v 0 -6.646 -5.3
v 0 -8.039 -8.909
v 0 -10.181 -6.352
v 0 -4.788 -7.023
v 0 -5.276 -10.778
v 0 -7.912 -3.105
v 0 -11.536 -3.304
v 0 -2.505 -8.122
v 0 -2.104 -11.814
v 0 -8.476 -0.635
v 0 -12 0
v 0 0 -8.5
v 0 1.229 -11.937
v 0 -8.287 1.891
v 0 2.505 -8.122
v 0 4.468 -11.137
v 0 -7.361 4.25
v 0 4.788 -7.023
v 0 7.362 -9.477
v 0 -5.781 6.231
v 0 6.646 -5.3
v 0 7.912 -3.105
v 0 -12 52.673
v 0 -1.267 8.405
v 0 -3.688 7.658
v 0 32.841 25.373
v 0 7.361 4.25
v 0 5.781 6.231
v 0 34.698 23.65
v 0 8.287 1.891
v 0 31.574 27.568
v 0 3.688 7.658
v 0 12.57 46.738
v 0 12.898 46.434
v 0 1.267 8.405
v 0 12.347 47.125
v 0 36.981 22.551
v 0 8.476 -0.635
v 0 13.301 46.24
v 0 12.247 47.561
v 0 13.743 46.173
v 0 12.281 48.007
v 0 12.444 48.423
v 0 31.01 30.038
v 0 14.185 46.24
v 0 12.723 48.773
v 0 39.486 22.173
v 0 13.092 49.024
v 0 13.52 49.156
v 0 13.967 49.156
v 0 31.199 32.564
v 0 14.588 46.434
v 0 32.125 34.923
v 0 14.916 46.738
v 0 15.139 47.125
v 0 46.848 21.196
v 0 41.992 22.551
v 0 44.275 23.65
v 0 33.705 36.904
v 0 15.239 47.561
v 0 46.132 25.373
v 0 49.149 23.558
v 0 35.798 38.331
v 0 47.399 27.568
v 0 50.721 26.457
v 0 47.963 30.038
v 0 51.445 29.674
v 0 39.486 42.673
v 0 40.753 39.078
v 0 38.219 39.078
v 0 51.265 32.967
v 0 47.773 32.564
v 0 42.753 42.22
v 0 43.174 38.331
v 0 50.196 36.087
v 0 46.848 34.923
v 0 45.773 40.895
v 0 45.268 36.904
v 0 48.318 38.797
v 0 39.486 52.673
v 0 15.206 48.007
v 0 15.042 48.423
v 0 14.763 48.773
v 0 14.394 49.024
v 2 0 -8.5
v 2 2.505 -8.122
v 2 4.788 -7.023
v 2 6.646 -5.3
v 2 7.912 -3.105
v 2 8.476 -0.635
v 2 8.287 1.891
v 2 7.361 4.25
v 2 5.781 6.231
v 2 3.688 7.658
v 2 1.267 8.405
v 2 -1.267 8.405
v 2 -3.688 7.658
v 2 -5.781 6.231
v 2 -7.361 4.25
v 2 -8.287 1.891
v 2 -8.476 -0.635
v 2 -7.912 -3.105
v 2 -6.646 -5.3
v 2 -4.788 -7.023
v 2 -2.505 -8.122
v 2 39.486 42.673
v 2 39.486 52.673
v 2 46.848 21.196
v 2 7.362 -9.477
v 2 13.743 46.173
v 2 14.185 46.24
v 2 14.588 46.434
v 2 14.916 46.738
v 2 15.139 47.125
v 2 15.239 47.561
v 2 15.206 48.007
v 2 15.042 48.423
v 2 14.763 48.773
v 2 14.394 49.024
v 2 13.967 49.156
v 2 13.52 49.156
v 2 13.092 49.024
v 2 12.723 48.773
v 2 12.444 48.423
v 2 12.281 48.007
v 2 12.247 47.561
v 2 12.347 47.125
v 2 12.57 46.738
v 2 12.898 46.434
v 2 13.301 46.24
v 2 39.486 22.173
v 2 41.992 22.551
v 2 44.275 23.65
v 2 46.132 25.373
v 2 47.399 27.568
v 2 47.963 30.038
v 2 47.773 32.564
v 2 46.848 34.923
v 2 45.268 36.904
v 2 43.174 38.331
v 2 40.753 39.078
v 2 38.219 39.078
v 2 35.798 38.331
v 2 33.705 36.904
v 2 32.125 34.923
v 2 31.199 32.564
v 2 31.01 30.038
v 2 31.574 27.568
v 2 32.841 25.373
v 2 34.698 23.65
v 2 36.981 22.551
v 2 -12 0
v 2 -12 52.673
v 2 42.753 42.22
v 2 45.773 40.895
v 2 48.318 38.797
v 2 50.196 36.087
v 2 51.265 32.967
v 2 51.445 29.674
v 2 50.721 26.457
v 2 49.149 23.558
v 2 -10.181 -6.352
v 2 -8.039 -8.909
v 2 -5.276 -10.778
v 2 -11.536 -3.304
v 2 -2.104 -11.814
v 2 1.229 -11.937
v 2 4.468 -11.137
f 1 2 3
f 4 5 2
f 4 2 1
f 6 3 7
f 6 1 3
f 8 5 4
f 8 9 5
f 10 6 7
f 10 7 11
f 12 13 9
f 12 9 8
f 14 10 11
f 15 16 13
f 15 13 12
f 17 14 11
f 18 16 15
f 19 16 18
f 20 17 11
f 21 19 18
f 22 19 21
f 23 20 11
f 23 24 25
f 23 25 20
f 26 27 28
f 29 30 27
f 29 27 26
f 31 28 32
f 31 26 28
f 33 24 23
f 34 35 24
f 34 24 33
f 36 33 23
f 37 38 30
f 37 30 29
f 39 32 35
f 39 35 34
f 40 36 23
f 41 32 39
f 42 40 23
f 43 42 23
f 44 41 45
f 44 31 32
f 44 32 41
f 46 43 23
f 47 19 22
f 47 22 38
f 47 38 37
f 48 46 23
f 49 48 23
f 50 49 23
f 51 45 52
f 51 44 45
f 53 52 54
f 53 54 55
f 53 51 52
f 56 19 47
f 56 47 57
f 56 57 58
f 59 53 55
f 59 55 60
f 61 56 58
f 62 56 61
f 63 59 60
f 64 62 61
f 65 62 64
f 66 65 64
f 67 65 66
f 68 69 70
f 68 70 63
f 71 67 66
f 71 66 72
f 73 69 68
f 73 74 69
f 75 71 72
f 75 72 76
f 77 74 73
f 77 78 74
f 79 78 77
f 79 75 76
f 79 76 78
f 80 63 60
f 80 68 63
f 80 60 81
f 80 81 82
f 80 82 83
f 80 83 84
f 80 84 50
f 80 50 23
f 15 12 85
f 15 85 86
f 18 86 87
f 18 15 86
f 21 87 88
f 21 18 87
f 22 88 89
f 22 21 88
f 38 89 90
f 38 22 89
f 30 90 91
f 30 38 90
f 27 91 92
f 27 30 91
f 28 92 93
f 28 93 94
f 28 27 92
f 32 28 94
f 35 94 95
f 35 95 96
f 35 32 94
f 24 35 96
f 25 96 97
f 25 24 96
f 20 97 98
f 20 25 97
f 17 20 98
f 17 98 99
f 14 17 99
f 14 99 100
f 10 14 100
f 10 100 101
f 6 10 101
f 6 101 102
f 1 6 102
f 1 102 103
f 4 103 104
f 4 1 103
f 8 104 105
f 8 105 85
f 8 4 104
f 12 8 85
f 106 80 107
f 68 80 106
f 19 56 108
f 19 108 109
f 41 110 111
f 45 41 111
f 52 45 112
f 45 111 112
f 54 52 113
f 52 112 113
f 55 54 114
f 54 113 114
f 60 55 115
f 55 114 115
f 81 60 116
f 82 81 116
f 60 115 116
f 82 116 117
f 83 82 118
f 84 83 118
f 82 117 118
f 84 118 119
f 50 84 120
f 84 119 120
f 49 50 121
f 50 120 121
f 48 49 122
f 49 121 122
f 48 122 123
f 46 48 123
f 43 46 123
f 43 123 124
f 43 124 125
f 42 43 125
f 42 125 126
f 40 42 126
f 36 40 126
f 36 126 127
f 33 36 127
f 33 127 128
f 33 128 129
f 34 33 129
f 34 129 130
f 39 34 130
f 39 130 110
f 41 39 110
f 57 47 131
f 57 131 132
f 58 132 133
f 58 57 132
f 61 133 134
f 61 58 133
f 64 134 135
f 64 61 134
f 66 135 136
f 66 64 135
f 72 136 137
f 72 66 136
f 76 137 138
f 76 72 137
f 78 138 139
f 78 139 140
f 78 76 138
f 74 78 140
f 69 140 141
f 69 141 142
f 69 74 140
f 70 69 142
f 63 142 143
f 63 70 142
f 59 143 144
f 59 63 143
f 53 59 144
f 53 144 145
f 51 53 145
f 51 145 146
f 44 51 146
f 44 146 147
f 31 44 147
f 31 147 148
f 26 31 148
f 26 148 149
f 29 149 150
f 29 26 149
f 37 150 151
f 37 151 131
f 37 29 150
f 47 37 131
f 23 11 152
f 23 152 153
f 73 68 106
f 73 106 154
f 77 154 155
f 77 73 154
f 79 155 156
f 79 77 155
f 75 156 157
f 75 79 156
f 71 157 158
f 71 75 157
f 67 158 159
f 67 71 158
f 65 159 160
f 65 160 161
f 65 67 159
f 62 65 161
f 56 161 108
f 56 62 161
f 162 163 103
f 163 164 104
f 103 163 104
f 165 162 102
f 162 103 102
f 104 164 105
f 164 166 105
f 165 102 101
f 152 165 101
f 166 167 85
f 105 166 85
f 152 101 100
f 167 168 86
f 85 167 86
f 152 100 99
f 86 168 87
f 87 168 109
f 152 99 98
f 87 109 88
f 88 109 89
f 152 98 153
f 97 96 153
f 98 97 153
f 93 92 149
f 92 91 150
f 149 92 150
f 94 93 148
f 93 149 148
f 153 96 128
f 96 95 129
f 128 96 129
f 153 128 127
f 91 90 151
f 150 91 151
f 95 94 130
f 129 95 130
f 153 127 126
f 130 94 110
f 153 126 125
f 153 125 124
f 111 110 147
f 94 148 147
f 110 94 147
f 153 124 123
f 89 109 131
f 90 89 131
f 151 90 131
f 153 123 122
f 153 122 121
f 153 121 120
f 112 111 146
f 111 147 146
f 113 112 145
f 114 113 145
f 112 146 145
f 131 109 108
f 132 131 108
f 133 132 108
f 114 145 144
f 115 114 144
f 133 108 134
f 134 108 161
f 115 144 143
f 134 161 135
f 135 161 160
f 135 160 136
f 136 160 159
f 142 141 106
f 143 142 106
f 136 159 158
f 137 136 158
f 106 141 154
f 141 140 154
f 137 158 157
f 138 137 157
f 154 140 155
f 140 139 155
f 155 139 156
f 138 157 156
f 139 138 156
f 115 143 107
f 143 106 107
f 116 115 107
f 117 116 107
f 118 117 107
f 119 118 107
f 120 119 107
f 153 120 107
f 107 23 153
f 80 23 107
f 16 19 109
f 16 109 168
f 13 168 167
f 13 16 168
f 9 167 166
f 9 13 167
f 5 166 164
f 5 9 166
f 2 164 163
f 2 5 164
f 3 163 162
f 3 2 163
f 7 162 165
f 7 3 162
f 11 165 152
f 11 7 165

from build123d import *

# Parameters (mm, degrees)
SKETCH_1_R          = 8.5
EXTRUDE_1_DEPTH     = 2
SKETCH_2_R          = 1.5
CUT_EXTRUDE_1_DEPTH = 10


with BuildPart() as part:
    # 草图1 → 凸台-拉伸1 (new body)
    with BuildSketch(Plane(origin=(0, 0, 0), x_dir=(0, 0, -1), z_dir=(1, 0, 0))):
        with BuildLine():
            ThreePointArc((9.47672316, 7.361502438), (10.778173065, -5.275508068), (0, -12))
            Line((0, -12), (-52.672926825, -12))
            Line((-52.672926825, -12), (-52.672926825, 39.486346501))
            Line((-52.672926825, 39.486346501), (-42.672926825, 39.486346501))
            ThreePointArc((-42.672926825, 39.486346501), (-34.56389856, 50.838013293), (-21.196203665, 46.847848939))
            Line((-21.196203665, 46.847848939), (9.47672316, 7.361502438))
        make_face()
        with Locations((-30.672926825, 39.486346501)):
            Circle(SKETCH_1_R, mode=Mode.SUBTRACT)
        Circle(SKETCH_1_R, mode=Mode.SUBTRACT)
    extrude(amount=EXTRUDE_1_DEPTH)

    # 草图2 → 切除-拉伸1 (cut)
    with BuildSketch(Plane(origin=(2, 0, 0), x_dir=(0, 0, -1), z_dir=(1, 0, 0))):
        with Locations((-47.672926825, 13.74317325)):
            Circle(SKETCH_2_R)
    extrude(amount=-CUT_EXTRUDE_1_DEPTH, mode=Mode.SUBTRACT)


solid = part.part
